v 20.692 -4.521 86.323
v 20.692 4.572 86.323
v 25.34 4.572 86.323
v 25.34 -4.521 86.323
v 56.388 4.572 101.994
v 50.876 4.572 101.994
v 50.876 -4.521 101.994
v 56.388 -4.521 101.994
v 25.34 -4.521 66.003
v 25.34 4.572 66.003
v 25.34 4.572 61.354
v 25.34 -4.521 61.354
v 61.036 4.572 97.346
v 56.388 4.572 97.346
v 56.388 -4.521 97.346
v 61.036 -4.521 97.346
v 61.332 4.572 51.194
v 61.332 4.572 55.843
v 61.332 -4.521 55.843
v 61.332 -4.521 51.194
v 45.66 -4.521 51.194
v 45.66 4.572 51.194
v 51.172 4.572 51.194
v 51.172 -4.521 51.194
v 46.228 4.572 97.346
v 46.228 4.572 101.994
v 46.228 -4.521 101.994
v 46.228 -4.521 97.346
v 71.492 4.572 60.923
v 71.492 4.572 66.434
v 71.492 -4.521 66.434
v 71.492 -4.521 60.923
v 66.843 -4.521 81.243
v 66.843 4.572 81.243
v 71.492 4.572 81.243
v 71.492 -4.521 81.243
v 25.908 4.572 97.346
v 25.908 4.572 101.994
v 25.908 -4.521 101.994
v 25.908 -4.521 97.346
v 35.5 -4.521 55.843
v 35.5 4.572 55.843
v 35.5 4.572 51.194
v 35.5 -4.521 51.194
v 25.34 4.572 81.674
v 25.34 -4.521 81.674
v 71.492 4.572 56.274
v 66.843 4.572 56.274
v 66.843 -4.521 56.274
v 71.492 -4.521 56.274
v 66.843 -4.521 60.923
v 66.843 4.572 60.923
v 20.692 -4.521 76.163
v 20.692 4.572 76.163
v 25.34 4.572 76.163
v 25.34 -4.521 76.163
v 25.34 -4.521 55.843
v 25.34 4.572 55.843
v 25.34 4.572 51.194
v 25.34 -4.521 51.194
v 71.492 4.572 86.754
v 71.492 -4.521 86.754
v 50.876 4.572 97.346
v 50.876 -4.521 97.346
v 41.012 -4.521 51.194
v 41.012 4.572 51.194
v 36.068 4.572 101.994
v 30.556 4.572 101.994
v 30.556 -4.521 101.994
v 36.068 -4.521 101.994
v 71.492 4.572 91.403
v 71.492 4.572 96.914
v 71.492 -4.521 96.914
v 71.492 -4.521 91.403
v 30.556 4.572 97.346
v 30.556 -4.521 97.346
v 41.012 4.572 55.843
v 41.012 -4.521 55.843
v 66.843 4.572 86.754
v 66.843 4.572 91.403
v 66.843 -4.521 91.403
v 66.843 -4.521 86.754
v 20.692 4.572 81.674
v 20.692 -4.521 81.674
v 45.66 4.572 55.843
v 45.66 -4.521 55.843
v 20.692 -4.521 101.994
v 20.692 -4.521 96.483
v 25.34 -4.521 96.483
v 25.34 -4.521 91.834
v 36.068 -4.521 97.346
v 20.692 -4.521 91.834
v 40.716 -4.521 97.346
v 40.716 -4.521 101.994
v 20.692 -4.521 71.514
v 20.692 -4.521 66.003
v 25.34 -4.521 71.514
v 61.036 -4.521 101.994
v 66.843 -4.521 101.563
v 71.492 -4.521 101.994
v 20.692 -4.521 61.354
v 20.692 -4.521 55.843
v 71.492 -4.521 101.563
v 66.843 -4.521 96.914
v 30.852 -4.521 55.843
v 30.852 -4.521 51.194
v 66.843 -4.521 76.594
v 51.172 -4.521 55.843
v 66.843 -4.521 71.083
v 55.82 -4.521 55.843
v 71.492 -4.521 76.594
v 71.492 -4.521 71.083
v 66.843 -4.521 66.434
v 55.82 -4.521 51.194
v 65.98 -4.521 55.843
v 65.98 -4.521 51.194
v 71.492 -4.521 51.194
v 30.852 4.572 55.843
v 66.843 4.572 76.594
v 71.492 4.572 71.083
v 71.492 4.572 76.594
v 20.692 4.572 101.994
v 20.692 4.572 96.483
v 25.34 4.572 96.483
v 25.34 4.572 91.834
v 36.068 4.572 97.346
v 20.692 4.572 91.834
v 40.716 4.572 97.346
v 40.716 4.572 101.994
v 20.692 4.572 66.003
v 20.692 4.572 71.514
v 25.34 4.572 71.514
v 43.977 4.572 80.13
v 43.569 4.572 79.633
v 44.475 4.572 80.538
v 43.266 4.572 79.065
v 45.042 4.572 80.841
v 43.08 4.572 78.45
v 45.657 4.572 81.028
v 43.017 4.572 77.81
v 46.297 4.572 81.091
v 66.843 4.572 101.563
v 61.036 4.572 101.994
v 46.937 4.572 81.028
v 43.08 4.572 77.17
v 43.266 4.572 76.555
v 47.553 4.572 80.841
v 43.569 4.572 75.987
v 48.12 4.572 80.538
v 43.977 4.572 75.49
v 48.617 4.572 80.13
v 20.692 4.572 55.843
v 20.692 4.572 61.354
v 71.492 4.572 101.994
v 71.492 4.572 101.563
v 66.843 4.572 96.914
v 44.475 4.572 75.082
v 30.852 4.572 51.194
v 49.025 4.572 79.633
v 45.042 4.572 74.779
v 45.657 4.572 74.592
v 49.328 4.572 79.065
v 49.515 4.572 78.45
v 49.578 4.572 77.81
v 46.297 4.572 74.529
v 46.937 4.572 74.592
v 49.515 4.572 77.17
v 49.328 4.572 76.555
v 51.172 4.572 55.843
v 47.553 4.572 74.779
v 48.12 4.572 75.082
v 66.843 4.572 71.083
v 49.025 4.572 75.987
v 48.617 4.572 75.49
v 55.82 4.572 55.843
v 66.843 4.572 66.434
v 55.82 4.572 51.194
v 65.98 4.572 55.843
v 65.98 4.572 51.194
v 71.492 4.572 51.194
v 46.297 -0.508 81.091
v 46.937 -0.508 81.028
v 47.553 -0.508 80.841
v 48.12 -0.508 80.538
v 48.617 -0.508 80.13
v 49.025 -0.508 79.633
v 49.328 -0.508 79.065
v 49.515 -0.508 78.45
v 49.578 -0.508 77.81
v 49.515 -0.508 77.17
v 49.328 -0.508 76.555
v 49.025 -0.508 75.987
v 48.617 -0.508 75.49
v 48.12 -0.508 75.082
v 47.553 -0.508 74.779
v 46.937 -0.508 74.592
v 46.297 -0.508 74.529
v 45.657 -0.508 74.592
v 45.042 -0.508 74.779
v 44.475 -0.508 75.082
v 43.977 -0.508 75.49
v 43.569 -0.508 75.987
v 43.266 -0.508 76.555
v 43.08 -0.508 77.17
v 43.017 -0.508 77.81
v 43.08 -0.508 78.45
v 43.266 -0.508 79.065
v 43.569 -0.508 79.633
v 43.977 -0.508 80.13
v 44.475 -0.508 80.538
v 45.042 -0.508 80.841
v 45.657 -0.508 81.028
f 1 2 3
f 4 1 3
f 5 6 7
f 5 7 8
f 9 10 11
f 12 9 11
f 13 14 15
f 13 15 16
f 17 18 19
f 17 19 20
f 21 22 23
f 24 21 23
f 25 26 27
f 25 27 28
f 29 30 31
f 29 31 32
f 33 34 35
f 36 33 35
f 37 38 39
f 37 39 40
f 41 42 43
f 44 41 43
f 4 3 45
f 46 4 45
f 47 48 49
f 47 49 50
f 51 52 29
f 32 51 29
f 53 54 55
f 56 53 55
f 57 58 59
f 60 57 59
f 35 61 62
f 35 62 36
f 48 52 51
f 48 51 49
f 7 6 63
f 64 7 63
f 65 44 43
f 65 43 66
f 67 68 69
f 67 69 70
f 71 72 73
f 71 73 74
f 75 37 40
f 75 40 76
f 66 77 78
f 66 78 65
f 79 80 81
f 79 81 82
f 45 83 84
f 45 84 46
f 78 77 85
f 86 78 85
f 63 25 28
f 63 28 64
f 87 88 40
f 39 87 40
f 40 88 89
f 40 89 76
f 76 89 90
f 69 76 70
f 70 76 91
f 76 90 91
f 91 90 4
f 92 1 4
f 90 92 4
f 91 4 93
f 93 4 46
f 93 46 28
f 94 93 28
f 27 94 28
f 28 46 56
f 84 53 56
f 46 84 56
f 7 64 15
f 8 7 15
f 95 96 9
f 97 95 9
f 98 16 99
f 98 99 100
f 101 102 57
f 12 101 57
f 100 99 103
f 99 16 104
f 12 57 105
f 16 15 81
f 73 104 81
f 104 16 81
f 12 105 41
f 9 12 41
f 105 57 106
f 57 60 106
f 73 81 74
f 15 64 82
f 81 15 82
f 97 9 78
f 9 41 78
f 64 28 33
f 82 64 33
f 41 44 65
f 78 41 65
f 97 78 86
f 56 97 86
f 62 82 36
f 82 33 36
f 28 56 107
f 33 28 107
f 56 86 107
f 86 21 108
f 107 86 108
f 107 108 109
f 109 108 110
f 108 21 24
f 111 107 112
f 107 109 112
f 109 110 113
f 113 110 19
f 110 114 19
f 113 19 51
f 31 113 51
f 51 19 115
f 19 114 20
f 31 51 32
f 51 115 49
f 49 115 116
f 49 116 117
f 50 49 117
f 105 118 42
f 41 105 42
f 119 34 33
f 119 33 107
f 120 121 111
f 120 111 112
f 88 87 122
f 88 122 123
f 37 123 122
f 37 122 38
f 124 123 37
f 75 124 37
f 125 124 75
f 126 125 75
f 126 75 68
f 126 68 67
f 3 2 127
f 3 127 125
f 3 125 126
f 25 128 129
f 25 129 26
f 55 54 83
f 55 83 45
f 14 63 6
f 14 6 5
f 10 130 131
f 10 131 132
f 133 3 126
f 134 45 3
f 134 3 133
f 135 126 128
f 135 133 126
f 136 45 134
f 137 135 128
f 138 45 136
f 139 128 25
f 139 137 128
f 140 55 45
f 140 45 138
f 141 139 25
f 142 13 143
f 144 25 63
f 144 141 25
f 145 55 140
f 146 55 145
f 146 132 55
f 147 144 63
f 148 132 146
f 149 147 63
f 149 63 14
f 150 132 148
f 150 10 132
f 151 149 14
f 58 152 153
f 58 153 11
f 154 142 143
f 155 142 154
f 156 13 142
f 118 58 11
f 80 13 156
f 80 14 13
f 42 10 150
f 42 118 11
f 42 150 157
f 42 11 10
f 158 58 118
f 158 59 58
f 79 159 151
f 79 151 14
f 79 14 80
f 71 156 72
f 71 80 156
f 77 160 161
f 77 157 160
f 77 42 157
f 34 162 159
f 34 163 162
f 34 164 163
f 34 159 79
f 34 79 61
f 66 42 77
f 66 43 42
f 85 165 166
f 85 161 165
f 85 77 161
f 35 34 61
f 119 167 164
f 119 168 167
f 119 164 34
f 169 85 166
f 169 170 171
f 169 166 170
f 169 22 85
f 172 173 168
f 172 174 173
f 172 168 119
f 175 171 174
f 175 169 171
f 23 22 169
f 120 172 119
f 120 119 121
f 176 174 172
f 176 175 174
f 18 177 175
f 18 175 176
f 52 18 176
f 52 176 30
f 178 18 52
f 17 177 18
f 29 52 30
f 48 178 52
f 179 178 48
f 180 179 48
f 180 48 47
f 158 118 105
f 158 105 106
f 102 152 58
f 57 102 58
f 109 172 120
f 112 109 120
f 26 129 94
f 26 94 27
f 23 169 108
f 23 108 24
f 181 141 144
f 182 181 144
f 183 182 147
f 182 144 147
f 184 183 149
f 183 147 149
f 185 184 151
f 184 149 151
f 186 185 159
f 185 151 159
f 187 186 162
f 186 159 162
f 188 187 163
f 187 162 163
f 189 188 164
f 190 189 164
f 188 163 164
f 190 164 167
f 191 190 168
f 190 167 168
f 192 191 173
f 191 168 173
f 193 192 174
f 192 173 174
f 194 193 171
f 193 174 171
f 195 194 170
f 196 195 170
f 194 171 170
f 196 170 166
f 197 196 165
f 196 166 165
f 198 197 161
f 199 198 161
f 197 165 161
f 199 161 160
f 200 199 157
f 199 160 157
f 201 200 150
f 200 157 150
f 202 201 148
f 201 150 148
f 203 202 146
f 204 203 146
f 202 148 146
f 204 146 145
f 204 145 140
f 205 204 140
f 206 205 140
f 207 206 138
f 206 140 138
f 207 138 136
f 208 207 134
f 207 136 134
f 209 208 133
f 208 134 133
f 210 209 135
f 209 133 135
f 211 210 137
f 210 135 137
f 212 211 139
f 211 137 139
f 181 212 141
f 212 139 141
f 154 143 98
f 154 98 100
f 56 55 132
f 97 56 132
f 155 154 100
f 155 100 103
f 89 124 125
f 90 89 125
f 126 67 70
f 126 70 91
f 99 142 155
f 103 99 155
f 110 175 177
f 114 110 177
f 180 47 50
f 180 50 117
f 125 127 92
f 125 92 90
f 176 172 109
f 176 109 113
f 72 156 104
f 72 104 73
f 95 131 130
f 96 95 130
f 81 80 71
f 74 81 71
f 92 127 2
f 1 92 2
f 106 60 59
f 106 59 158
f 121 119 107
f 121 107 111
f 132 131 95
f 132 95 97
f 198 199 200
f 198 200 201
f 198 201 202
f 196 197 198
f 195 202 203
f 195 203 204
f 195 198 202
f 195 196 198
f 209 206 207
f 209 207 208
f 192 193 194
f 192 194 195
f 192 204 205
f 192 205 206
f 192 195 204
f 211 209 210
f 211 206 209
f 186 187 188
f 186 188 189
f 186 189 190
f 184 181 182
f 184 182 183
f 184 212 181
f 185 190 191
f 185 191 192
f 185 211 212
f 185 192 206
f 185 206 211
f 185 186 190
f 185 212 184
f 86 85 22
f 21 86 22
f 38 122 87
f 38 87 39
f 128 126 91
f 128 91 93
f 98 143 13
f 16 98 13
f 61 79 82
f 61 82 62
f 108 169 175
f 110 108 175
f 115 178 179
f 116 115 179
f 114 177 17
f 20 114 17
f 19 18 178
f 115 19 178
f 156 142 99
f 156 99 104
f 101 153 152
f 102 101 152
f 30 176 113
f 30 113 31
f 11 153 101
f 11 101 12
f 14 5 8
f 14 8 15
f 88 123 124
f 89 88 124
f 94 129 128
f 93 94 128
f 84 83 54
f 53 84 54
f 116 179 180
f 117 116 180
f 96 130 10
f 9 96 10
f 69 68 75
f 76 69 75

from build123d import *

# Parameters (mm, degrees)
SKETCH3_W                = 50.8
SKETCH3_H                = 50.8
BOSS_EXTRUDE5_DEPTH      = 4.572
BOSS_EXTRUDE5_DEPTH_BACK = 4.5212
SKETCH4_W                = 4.6482
SKETCH4_H                = 4.6482
CUT_EXTRUDE4_DEPTH       = 9.0932
SKETCH10_R               = 3.280660975
CUT_EXTRUDE9_DEPTH       = 5.08
SKETCH9_W                = 4.6482
SKETCH9_H                = 4.6482
CUT_EXTRUDE10_DEPTH      = 9.144
LPATTERN1_COUNT          = 5
LPATTERN1_PITCH          = 10.16
LPATTERN2_COUNT          = 5
LPATTERN2_PITCH          = 10.16
LPATTERN3_COUNT          = 5
LPATTERN3_PITCH          = 10.16
SKETCH13_W               = 4.6482
SKETCH13_H               = 4.6482
CUT_EXTRUDE11_DEPTH      = 9.144
LPATTERN4_COUNT          = 4
LPATTERN4_PITCH          = 10.16


with BuildPart() as part:
    # Sketch3 → Boss-Extrude5 (new body, two sides)
    with BuildSketch(Plane(origin=(0, 0, 0), x_dir=(1, 0, 0), z_dir=(0, 1, 0))) as boss_extrude5_sk:
        with Locations((46.091507602, -76.594393473)):
            Rectangle(SKETCH3_W, SKETCH3_H)
    extrude(amount=BOSS_EXTRUDE5_DEPTH)
    extrude(boss_extrude5_sk.sketch, amount=-BOSS_EXTRUDE5_DEPTH_BACK)

    # Sketch4 → Cut-Extrude4 (cut)
    with BuildSketch(Plane(origin=(0, 4.572, 0), x_dir=(1, 0, 0), z_dir=(0, 1, 0))):
        with Locations((23.015607602, -53.518493473)):
            Rectangle(SKETCH4_W, SKETCH4_H)
    cut_extrude4 = extrude(amount=-CUT_EXTRUDE4_DEPTH, mode=Mode.SUBTRACT)

    # Sketch10 → Cut-Extrude9 (cut)
    with BuildSketch(Plane(origin=(0, 4.572, 0), x_dir=(1, 0, 0), z_dir=(0, 1, 0))):
        with Locations(Location((46.297206245, -77.809978732, 0), (0, 0, 270))):  # turned: the seam where the file's is
            Circle(SKETCH10_R)
    extrude(amount=-CUT_EXTRUDE9_DEPTH, mode=Mode.SUBTRACT)

    # Sketch9 → Cut-Extrude10 (cut)
    with BuildSketch(Plane(origin=(0, 4.572, 0), x_dir=(1, 0, 0), z_dir=(0, 1, 0))):
        with Locations((69.167407602, -58.59849342)):
            Rectangle(SKETCH9_W, SKETCH9_H)
    cut_extrude10 = extrude(amount=-CUT_EXTRUDE10_DEPTH, mode=Mode.SUBTRACT)

    # LPattern1: Cut-Extrude4 ×5
    with Locations(*[(0, 0, i * LPATTERN1_PITCH) for i in range(1, LPATTERN1_COUNT)]):
        add(cut_extrude4, mode=Mode.SUBTRACT)

    # LPattern2: Cut-Extrude10 ×5
    with Locations(*[(0, 0, i * LPATTERN2_PITCH) for i in range(1, LPATTERN2_COUNT)]):
        add(cut_extrude10, mode=Mode.SUBTRACT)

    # LPattern3: Cut-Extrude4 ×5
    with Locations(*[(i * LPATTERN3_PITCH, 0, 0) for i in range(1, LPATTERN3_COUNT)]):
        add(cut_extrude4, mode=Mode.SUBTRACT)

    # Sketch13 → Cut-Extrude11 (cut)
    with BuildSketch(Plane(origin=(0, 4.572, 0), x_dir=(1, 0, 0), z_dir=(0, 1, 0))):
        with Locations((28.2321, -99.670293473)):
            Rectangle(SKETCH13_W, SKETCH13_H)
    cut_extrude11 = extrude(amount=-CUT_EXTRUDE11_DEPTH, mode=Mode.SUBTRACT)

    # LPattern4: Cut-Extrude11 ×4
    with Locations(*[(i * LPATTERN4_PITCH, 0, 0) for i in range(1, LPATTERN4_COUNT)]):
        add(cut_extrude11, mode=Mode.SUBTRACT)


solid = part.part
